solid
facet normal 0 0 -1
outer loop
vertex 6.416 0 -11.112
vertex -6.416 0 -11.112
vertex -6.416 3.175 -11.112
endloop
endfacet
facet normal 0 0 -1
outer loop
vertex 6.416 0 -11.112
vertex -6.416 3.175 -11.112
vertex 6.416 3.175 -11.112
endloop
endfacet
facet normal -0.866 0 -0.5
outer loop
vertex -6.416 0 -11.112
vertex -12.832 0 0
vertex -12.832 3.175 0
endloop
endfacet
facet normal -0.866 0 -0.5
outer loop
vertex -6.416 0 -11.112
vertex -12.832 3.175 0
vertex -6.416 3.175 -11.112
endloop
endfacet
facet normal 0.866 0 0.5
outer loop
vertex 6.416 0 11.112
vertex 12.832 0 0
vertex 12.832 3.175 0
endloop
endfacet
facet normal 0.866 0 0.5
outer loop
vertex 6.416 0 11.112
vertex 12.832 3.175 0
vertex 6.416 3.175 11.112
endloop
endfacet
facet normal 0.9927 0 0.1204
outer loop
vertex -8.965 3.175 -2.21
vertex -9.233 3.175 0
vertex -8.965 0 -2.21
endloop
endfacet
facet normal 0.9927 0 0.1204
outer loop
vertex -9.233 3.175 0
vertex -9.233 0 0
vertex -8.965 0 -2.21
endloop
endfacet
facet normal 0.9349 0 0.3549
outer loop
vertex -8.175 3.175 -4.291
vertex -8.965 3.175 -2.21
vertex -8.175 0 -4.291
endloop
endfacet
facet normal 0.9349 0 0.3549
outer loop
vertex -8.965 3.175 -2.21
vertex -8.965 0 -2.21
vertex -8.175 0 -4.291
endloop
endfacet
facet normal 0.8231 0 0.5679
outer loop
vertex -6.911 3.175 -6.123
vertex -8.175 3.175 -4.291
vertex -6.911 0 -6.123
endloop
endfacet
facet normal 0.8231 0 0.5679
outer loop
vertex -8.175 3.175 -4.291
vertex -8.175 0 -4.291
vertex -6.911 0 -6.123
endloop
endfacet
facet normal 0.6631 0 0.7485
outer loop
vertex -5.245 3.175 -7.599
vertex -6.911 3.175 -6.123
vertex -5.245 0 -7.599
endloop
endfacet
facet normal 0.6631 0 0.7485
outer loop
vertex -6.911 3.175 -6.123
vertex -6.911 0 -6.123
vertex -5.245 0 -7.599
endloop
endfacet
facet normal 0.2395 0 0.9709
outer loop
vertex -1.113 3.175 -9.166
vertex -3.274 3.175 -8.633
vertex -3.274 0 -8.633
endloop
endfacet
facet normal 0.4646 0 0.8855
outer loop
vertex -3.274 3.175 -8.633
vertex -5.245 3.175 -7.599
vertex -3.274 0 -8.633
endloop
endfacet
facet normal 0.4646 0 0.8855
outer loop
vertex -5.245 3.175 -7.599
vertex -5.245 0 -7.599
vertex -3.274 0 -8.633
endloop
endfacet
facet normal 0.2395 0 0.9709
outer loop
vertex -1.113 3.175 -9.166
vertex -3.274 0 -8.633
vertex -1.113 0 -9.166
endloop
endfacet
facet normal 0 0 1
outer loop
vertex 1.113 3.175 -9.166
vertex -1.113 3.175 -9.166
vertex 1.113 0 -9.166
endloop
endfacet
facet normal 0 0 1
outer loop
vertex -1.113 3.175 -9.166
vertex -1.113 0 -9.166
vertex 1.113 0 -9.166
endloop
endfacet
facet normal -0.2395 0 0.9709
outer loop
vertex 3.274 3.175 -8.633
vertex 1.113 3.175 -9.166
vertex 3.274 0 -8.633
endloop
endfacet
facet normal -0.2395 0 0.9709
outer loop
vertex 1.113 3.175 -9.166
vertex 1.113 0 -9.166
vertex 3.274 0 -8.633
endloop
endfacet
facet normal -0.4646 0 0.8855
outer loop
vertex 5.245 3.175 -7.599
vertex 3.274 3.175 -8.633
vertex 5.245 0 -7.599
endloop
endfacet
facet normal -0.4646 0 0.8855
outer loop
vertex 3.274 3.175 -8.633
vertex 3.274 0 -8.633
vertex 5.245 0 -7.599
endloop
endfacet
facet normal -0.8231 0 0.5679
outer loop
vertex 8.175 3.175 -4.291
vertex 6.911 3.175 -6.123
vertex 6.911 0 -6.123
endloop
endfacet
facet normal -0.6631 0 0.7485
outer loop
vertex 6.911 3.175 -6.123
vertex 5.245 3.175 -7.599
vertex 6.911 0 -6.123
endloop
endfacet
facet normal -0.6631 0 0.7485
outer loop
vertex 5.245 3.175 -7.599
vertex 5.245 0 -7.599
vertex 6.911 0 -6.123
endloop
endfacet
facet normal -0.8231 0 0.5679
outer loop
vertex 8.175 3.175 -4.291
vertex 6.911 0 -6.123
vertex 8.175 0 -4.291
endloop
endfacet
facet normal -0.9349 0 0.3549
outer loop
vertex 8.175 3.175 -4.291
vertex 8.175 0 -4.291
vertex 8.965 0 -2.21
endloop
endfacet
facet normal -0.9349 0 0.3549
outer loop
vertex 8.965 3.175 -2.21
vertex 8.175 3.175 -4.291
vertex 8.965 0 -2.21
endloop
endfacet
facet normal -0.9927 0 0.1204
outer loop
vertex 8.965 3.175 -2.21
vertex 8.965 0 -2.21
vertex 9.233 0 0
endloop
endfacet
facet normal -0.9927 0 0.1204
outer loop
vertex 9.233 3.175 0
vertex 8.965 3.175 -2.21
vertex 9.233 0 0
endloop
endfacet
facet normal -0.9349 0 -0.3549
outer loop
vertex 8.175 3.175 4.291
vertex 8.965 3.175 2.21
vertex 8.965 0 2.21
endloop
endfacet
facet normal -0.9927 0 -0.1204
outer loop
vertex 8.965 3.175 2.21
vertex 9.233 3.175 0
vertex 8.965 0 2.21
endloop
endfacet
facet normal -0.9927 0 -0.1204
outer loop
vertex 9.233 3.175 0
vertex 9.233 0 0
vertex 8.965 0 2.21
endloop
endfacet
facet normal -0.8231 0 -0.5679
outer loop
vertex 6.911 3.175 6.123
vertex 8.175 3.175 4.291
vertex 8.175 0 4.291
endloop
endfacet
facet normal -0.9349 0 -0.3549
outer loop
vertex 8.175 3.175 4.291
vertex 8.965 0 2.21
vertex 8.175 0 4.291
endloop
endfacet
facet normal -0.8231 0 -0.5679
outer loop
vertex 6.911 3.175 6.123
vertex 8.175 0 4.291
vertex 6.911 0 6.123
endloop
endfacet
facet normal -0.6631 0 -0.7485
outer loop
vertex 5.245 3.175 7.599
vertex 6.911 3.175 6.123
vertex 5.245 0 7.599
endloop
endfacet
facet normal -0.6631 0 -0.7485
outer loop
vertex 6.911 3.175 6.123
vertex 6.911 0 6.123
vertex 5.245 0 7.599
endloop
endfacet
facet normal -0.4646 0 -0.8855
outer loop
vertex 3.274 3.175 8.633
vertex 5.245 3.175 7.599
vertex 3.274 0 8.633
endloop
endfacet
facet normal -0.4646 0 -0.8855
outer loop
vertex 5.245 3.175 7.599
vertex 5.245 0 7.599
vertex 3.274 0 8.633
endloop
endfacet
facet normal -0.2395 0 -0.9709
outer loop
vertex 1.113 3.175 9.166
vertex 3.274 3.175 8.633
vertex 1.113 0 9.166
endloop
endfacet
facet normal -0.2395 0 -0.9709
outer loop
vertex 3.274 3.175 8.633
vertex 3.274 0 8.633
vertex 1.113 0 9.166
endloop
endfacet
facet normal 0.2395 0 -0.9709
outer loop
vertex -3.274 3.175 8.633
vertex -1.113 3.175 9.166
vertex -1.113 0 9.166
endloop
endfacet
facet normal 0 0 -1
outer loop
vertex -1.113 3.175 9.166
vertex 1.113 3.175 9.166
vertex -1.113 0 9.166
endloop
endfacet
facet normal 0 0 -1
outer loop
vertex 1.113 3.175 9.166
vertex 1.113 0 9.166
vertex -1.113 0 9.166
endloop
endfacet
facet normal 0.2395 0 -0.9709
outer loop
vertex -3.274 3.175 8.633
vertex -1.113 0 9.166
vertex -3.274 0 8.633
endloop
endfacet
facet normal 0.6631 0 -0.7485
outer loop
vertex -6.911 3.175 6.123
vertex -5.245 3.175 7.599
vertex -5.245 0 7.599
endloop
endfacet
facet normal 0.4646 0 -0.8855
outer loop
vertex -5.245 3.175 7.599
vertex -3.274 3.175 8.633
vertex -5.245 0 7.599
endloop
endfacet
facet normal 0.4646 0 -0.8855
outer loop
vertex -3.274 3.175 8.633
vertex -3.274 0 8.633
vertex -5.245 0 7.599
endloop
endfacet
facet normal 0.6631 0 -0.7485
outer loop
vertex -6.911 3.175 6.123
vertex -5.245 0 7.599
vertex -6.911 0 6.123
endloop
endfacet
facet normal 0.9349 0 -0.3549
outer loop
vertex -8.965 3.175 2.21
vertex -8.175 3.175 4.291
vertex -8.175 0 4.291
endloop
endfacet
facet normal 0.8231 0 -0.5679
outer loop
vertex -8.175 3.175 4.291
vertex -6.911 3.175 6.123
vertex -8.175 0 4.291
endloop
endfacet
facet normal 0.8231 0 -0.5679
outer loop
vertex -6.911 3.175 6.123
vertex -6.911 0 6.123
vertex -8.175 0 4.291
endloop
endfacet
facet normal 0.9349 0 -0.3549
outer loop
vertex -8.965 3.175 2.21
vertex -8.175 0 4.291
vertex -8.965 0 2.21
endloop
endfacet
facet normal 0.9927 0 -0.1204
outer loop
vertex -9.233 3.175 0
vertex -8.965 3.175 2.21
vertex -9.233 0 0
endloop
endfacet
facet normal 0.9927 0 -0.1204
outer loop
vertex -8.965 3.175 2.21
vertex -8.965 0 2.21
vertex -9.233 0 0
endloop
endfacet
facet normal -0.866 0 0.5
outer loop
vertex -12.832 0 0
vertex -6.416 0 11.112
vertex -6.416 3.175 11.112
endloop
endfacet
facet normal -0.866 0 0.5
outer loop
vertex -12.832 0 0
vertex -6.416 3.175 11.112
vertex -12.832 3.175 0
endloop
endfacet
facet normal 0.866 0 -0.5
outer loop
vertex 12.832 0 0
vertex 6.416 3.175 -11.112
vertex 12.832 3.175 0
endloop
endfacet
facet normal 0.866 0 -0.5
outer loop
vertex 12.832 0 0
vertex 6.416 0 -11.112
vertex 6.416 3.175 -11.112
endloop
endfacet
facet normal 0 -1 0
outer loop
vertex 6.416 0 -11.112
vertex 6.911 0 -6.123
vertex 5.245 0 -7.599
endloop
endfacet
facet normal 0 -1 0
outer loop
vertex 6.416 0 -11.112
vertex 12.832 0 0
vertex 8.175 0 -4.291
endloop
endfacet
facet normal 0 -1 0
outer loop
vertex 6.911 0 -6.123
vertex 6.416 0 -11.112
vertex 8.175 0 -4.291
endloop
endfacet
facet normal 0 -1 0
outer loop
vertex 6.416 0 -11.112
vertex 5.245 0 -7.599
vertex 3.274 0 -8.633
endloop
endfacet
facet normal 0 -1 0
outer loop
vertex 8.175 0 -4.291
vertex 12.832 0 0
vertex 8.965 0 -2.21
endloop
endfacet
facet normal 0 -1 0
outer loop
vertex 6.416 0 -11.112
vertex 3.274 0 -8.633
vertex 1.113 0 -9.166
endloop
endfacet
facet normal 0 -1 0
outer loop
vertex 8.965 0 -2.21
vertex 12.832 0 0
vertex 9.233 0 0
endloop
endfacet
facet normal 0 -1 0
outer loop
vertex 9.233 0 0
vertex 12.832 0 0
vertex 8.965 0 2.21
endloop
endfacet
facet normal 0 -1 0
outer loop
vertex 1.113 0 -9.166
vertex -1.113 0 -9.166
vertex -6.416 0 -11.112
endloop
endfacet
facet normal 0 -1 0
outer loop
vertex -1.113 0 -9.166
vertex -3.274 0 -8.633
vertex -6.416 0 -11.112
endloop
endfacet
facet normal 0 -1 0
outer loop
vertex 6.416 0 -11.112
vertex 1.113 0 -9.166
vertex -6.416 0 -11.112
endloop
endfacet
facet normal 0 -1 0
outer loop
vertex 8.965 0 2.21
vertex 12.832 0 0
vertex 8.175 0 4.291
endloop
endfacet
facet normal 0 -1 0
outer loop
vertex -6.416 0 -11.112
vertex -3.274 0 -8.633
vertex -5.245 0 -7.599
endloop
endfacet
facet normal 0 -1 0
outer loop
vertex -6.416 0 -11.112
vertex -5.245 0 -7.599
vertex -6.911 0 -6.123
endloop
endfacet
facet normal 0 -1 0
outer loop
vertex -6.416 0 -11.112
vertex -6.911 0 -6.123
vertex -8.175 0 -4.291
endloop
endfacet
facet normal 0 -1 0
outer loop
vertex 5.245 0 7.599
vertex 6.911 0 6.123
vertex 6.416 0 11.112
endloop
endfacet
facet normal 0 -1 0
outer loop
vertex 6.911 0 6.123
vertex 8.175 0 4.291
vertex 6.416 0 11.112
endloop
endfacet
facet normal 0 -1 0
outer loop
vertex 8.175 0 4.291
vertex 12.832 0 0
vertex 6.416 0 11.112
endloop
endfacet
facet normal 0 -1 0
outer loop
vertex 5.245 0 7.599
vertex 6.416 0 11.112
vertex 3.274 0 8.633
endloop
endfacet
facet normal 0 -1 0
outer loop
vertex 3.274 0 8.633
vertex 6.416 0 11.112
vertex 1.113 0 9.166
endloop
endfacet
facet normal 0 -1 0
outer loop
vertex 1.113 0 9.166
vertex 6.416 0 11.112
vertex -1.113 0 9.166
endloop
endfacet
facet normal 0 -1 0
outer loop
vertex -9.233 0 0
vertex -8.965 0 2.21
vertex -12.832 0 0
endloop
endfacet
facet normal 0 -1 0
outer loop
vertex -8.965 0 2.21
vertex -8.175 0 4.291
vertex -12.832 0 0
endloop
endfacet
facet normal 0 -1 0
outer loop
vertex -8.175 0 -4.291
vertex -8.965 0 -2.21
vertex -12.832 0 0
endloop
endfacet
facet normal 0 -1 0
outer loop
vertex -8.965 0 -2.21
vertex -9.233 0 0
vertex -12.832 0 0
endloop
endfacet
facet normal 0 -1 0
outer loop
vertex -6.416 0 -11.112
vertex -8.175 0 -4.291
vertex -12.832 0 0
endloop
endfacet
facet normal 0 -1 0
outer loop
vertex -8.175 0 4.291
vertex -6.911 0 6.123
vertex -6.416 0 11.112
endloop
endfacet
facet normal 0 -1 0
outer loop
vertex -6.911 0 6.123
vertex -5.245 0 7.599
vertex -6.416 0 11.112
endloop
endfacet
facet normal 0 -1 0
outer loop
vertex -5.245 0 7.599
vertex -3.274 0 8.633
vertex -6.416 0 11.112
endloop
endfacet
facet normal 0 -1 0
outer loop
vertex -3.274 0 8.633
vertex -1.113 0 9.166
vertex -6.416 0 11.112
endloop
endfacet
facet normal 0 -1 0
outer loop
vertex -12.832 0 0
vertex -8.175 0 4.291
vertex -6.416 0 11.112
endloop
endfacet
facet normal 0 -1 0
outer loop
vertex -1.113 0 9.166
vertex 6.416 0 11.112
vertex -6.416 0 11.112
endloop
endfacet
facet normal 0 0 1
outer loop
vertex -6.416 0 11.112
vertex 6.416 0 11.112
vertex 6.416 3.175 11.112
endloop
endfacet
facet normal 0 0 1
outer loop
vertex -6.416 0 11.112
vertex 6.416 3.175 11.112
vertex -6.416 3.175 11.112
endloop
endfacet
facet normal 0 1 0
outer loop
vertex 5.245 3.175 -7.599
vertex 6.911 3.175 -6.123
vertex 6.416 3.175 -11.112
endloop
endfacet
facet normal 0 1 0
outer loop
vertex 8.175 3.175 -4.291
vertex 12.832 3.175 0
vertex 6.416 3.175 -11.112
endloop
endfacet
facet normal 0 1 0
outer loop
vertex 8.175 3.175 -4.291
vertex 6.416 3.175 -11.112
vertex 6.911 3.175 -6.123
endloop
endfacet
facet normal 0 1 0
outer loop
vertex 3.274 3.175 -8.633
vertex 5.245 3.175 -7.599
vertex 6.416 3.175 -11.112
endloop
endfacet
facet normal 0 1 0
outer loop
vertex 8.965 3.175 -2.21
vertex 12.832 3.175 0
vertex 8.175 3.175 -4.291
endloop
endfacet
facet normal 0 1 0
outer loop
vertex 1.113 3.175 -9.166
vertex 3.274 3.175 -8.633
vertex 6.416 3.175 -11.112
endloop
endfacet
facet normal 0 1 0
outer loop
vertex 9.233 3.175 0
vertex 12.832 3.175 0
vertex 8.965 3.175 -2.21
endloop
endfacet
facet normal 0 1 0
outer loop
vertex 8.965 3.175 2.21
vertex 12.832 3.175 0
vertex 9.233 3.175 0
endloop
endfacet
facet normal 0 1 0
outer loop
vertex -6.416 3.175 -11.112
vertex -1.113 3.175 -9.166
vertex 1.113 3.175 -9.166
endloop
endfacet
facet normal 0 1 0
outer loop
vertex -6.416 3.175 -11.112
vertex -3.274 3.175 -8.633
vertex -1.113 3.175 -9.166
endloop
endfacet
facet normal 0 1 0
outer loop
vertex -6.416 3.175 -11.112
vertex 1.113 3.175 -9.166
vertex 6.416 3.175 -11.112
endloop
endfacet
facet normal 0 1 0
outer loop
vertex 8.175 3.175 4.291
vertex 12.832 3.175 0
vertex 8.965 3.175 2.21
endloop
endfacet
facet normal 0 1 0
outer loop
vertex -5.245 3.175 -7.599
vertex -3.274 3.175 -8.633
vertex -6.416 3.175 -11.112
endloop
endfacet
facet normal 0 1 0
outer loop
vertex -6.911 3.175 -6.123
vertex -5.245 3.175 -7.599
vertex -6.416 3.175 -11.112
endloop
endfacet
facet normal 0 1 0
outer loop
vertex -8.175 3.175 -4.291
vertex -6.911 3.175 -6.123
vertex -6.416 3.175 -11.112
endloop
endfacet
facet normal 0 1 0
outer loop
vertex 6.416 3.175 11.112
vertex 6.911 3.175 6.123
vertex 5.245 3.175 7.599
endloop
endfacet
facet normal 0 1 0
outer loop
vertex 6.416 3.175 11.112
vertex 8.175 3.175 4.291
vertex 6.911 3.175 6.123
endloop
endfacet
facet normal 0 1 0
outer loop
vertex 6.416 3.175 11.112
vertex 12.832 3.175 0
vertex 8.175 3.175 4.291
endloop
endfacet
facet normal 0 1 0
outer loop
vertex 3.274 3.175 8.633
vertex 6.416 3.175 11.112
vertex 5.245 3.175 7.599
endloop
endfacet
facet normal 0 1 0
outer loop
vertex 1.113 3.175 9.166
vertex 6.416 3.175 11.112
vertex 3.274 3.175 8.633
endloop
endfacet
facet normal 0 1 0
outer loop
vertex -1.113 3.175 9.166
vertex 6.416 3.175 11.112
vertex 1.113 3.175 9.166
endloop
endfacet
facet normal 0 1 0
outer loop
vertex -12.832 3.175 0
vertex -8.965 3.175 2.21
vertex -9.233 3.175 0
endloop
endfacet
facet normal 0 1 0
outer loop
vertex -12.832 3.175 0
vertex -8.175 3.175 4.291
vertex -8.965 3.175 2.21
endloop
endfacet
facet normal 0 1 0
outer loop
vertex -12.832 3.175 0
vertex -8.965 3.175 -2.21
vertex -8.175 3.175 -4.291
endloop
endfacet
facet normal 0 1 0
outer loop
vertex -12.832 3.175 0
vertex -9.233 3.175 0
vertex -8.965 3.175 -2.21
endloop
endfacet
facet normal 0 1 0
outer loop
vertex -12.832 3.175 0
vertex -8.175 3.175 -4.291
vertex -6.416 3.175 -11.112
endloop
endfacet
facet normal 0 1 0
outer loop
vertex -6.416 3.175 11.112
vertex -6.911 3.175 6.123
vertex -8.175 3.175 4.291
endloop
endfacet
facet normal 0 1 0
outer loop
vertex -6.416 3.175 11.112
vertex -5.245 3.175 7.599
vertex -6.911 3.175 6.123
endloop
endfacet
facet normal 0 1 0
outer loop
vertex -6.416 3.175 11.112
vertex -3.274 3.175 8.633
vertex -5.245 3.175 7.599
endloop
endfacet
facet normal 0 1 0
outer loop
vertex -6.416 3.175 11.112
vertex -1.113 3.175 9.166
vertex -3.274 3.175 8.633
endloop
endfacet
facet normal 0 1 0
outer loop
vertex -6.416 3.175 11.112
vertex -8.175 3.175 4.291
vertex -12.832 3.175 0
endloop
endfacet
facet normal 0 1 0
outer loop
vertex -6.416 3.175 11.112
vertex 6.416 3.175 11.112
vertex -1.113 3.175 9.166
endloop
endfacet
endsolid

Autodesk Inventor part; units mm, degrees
ref_plane "YZ Plane" through (0, 0, 0) normal (1, 0, 0) x (0, 1, 0)
ref_plane "XZ Plane" through (0, 0, 0) normal (0, 1, 0) x (-1, 0, 0)
ref_plane "XY Plane" through (0, 0, 0) normal (0, 0, 1) x (1, 0, 0)
sketch "Sketch1" plane through (0, 0, 0) normal (0, 1, 0) x (-1, 0, 0)
  line L0 (6.4158, 11.1125) -> (12.8316, 0)
  line L1 (12.8316, 0) -> (6.4158, -11.1125)
  line L2 (6.4158, -11.1125) -> (-6.4158, -11.1125)
  line L3 (-6.4158, -11.1125) -> (-12.8316, 0)
  line L4 (-12.8316, 0) -> (-6.4158, 11.1125)
  line L5 (-6.4158, 11.1125) -> (6.4158, 11.1125)
  circle A0 centre (0, 0) radius 9.2329
  point P0 (0, 11.1125)
  dimension "d0" = 11.1125
  dimension "d1" = 18.4658
extrude "Extrusion1" add sketch "Sketch1" along normal blind 3.175
thread "Thread1" size "3/4-20 UNEF" class "2B" standard "ANSI Unified Screw Threads" full length
properties part number "KeyLockNut"
